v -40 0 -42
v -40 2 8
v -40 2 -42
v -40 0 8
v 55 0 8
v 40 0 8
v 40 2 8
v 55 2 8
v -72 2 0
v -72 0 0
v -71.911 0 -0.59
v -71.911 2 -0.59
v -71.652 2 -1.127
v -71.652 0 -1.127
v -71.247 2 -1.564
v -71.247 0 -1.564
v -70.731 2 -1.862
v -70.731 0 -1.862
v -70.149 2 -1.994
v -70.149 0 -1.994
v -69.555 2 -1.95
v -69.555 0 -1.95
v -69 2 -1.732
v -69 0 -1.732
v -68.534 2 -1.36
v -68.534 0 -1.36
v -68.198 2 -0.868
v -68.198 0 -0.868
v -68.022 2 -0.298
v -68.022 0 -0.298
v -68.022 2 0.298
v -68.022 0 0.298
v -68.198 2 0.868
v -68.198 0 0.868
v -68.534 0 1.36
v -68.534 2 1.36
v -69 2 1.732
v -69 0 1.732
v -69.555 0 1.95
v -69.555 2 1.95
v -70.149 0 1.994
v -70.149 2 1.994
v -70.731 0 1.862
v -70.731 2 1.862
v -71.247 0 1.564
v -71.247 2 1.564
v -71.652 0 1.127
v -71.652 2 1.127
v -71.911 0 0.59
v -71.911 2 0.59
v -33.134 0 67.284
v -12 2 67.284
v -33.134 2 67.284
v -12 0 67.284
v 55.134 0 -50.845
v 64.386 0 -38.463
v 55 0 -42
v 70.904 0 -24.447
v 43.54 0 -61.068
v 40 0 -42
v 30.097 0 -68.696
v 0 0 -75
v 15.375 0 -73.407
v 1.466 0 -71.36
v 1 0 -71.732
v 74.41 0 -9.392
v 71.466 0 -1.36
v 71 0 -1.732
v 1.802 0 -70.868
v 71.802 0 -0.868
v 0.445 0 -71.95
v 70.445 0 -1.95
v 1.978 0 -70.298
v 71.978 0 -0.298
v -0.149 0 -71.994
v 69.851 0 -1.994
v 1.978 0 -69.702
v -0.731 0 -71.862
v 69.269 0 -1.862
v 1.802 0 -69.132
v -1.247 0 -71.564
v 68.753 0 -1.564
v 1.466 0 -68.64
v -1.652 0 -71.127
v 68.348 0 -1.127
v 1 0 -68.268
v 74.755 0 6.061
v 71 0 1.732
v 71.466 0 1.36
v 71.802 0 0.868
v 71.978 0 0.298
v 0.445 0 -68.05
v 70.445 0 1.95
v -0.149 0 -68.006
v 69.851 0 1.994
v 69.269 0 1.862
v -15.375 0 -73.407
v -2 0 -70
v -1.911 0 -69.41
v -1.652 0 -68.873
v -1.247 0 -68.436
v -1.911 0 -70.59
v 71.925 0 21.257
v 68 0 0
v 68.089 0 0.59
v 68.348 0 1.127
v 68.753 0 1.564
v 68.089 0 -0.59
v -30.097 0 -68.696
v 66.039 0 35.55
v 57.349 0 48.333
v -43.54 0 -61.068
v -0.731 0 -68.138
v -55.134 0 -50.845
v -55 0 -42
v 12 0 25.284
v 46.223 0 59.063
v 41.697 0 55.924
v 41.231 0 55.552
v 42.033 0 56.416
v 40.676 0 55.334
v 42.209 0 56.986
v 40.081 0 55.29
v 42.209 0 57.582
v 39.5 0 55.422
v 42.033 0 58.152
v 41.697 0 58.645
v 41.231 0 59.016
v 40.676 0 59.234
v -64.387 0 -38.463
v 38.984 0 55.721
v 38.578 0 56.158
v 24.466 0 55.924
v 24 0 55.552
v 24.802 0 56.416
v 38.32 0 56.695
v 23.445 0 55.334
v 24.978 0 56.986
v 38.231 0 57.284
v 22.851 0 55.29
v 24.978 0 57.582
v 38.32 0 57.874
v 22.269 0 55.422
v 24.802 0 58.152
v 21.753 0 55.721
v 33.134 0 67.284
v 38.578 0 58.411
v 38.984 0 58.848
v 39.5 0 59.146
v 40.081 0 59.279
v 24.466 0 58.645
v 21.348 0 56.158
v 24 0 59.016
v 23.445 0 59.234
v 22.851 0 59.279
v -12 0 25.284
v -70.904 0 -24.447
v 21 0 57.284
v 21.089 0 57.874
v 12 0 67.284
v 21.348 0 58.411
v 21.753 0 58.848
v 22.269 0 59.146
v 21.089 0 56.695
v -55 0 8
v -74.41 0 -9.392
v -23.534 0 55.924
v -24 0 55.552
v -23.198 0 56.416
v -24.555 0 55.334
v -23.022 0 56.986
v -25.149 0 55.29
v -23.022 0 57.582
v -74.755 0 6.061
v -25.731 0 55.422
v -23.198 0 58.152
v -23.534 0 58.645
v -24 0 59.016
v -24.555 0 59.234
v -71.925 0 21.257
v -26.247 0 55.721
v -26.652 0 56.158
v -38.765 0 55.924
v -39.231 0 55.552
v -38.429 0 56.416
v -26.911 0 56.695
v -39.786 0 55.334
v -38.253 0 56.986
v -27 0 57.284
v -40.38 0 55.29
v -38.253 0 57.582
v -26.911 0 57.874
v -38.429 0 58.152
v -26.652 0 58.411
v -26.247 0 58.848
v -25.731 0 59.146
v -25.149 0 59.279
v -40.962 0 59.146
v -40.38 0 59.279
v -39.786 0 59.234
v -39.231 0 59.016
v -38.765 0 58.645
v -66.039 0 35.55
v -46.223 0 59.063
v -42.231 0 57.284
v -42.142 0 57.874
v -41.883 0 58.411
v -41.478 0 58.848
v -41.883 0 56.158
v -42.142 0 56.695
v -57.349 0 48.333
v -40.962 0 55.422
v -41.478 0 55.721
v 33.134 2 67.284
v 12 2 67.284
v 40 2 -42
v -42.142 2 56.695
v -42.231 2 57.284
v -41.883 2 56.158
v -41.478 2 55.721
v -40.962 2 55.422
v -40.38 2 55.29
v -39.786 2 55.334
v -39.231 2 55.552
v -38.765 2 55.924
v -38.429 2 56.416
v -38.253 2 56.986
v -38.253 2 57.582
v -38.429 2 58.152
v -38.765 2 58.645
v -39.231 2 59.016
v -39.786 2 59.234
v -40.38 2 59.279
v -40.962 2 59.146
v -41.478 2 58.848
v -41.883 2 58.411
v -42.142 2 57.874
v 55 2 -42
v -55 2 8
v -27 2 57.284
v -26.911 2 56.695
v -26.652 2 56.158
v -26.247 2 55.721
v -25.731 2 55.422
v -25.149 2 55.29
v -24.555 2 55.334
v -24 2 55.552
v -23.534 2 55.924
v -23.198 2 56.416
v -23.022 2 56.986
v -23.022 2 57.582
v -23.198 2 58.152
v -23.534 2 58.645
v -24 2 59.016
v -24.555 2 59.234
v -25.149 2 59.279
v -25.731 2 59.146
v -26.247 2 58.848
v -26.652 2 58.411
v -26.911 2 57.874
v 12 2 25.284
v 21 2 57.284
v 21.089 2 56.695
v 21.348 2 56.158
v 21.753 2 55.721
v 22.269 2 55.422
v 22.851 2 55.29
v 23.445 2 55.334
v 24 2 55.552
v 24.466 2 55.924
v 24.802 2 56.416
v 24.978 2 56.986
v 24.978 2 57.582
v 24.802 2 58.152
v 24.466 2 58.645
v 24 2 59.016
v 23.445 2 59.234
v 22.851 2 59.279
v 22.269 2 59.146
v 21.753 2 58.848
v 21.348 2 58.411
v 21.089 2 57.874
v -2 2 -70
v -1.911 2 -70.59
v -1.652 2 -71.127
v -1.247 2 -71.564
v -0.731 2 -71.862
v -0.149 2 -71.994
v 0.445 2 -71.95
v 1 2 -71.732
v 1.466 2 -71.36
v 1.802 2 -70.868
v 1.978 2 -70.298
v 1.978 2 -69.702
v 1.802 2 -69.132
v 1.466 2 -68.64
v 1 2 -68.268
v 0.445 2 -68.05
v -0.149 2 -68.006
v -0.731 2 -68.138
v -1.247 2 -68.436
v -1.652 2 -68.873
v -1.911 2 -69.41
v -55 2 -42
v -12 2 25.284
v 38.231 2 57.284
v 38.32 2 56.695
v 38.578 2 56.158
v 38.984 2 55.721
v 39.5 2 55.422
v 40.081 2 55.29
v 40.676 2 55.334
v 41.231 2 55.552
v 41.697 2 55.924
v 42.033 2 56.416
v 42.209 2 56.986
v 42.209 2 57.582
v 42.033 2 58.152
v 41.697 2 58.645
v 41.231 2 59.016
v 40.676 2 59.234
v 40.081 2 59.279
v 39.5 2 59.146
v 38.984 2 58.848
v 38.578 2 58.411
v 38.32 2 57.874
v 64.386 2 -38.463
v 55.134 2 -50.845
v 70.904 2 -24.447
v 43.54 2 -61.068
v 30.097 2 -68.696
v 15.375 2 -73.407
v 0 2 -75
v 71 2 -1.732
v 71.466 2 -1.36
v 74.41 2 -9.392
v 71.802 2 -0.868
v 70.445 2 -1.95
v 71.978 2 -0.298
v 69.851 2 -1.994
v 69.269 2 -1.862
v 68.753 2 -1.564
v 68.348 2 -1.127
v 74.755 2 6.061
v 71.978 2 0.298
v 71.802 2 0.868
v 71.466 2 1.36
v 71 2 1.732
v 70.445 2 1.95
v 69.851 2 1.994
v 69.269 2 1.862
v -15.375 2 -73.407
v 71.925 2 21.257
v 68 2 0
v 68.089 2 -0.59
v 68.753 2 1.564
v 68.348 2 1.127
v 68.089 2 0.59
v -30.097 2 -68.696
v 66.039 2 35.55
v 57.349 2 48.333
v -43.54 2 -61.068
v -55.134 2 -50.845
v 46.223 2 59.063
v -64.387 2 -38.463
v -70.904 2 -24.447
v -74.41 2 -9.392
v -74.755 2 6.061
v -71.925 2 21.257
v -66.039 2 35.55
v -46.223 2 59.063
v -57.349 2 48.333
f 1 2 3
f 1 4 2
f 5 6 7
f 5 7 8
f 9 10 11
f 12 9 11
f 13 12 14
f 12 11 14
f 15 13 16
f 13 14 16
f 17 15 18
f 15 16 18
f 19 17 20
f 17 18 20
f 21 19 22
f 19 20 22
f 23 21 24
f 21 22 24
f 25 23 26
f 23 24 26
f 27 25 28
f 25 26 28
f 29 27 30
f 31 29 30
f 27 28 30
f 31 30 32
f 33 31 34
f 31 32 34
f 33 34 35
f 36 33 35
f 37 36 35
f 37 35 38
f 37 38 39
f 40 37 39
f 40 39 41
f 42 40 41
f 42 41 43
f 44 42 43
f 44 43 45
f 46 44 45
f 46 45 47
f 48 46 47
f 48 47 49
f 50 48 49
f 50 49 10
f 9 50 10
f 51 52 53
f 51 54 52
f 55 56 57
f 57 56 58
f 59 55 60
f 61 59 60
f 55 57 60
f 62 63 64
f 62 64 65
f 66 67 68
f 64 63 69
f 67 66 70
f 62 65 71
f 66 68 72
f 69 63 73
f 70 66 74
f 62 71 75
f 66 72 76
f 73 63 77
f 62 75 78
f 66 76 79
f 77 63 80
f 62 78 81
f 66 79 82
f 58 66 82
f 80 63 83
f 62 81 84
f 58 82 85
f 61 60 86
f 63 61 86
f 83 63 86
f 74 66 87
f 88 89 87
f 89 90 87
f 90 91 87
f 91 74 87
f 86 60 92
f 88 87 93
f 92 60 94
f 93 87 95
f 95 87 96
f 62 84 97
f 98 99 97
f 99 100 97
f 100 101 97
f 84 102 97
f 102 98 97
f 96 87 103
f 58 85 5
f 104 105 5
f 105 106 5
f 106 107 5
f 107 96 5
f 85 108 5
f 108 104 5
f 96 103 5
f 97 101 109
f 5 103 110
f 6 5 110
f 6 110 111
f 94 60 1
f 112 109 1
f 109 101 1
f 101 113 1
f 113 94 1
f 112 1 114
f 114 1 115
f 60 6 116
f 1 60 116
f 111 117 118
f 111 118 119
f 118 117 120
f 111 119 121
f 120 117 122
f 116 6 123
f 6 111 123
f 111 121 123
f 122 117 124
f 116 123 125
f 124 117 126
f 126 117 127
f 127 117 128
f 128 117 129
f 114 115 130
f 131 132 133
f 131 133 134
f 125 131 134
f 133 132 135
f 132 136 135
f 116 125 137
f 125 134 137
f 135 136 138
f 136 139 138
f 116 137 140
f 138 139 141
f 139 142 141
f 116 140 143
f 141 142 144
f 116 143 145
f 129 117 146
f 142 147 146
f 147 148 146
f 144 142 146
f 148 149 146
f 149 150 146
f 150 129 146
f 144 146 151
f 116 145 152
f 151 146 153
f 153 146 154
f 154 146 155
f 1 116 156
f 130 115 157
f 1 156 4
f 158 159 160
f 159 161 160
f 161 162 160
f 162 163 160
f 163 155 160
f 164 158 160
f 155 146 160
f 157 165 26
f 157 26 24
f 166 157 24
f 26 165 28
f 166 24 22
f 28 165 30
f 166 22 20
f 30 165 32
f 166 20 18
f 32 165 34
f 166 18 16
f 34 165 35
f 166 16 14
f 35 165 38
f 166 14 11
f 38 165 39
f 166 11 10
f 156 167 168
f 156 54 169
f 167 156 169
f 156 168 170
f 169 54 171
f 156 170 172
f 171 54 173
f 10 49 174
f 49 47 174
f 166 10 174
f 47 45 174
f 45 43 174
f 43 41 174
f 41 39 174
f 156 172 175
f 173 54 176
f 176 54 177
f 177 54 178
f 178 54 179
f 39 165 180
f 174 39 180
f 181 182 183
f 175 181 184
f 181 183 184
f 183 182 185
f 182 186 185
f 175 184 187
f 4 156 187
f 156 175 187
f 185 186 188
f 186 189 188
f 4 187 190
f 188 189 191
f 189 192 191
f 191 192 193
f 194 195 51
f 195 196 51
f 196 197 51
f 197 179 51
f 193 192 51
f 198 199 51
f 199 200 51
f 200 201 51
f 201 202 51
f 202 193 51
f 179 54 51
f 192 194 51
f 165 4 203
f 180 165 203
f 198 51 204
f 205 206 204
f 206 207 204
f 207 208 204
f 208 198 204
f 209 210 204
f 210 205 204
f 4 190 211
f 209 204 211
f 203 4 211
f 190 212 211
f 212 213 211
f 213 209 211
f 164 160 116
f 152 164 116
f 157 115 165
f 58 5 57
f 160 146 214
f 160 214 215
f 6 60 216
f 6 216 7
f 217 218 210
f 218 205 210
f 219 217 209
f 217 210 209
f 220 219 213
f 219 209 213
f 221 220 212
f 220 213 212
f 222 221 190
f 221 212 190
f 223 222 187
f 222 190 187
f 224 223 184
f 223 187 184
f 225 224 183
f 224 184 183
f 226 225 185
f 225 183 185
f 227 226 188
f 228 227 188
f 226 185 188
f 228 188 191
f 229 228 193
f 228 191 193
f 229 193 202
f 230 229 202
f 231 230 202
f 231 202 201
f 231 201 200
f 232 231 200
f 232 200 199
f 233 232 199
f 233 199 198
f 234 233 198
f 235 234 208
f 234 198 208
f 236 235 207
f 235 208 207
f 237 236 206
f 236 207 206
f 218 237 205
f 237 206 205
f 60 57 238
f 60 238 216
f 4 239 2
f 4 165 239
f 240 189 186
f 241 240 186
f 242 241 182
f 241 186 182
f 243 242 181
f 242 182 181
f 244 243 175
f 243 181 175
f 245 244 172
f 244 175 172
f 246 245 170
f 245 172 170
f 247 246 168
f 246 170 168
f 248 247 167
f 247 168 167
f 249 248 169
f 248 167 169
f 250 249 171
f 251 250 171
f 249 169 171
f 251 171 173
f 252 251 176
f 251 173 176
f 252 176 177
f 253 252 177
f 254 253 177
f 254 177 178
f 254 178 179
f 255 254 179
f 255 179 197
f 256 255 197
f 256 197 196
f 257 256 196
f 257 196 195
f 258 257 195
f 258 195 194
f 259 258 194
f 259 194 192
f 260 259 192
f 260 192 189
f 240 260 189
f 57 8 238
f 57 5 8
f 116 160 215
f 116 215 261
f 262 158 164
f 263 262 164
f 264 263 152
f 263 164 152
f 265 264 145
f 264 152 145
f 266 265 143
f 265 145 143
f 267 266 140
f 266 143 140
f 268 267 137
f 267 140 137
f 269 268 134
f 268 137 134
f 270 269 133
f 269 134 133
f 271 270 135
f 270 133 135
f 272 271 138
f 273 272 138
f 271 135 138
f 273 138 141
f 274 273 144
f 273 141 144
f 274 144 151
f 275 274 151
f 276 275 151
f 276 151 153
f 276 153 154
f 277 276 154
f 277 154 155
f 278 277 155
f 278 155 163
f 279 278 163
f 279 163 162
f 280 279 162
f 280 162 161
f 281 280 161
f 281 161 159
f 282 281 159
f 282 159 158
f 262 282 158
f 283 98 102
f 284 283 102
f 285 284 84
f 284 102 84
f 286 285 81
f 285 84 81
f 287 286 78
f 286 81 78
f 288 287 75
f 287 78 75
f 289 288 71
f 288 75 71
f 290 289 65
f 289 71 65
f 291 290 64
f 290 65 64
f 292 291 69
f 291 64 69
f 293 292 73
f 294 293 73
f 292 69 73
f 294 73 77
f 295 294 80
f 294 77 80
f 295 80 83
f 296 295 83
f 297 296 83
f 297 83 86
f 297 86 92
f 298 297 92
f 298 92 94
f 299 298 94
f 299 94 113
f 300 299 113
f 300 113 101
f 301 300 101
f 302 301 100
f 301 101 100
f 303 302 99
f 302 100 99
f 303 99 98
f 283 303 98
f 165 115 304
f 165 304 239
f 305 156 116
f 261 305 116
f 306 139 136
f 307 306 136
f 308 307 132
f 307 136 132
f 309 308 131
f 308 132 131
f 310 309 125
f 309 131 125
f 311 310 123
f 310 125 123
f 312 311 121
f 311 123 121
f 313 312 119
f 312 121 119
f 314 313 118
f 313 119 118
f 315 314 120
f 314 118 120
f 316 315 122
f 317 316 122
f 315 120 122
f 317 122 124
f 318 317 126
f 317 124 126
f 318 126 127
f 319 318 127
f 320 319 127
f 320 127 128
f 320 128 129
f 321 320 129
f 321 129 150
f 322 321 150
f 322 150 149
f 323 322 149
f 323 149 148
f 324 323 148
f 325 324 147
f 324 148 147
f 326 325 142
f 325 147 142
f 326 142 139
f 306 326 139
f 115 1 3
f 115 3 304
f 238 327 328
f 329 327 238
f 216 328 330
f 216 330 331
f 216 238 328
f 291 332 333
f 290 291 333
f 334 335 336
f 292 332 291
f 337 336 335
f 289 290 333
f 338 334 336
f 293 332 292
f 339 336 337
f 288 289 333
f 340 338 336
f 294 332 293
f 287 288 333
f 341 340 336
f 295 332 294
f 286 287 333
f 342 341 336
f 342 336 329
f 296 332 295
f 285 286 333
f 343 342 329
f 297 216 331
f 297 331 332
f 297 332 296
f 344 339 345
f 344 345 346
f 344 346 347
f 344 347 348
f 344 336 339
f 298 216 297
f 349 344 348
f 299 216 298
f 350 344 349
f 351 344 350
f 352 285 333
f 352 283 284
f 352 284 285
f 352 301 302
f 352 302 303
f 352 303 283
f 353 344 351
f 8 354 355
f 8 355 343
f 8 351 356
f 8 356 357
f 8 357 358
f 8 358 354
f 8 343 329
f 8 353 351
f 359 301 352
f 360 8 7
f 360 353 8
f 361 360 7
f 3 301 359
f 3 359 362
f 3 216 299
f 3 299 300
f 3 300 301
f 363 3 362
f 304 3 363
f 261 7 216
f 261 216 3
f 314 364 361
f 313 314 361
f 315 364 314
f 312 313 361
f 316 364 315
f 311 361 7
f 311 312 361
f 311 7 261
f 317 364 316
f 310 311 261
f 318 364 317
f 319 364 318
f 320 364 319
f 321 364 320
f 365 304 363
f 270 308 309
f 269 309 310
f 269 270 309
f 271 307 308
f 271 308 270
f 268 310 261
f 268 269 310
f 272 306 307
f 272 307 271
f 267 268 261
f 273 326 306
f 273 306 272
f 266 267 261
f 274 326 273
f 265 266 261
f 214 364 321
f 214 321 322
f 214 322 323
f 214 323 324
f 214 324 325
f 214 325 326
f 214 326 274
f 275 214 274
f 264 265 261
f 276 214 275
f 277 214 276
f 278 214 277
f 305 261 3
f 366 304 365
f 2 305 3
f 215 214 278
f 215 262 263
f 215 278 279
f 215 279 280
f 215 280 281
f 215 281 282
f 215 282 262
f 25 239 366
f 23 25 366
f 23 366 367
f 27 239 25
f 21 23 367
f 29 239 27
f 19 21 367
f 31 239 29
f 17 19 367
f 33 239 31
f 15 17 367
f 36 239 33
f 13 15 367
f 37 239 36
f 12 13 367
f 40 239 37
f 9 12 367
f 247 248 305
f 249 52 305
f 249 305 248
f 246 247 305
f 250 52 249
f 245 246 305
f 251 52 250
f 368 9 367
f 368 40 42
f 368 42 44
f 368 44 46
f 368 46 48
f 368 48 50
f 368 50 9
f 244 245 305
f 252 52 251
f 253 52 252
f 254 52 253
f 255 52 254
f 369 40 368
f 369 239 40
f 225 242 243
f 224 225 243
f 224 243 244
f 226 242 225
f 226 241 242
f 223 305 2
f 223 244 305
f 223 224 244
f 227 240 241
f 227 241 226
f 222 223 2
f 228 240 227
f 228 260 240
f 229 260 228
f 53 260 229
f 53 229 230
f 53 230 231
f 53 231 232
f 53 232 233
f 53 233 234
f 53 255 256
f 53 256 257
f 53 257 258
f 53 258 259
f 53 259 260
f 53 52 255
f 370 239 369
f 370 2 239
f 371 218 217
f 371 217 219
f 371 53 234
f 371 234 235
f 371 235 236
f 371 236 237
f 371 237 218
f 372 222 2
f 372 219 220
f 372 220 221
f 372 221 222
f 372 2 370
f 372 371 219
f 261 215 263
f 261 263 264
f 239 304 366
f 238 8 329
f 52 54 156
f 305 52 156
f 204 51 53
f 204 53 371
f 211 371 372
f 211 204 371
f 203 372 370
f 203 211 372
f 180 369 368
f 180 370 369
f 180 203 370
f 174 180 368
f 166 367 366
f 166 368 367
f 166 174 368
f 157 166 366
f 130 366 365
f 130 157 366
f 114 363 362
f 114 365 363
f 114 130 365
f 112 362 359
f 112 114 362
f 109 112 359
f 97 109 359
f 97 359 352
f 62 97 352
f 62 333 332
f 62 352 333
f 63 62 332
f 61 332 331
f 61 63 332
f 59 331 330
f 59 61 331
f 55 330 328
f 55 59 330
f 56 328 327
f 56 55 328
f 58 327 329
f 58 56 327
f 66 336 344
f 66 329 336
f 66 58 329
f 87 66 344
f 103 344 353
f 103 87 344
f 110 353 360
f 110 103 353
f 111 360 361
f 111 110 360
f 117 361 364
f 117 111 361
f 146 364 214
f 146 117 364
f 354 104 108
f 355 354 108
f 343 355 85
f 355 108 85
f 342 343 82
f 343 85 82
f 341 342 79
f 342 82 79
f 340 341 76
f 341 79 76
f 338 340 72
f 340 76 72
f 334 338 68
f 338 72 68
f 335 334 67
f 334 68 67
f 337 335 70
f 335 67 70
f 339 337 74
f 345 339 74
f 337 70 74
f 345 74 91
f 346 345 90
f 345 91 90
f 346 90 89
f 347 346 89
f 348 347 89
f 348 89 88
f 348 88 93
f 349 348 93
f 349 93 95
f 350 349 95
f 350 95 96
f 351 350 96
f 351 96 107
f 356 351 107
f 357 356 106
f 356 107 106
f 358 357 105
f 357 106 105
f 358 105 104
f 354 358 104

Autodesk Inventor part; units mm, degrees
ref_plane "YZ Plane" through (0, 0, 0) normal (1, 0, 0) x (0, 1, 0)
ref_plane "XZ Plane" through (0, 0, 0) normal (0, 1, 0) x (-1, 0, 0)
ref_plane "XY Plane" through (0, 0, 0) normal (0, 0, 1) x (1, 0, 0)
sketch "Boceto1" plane through (0, 0, 0) normal (0, 1, 0) x (-1, 0, 0)
  arc A0 (-18, 72.808) -> (20, 72.2842) centre (0, 0) ccw
  line L0 (-18, 72.808) -> (-18, 72.2842)
  line L1 (55, 8) -> (40, 8)
  line L2 (40, 8) -> (40, -42)
  line L3 (40, -42) -> (55, -42)
  line L4 (55, -42) -> (55, 8)
  line L5 (-40, 8) -> (-55, 8)
  line L6 (-55, 8) -> (-55, -42)
  line L7 (-55, -42) -> (-40, -42)
  line L8 (-40, -42) -> (-40, 8)
  line L9 (20, 72.2842) -> (12, 72.2842)
  line L10 (12, 72.2842) -> (12, 25.2842)
  line L11 (-18, 72.808) -> (-12, 72.808)
  line L12 (-12, 72.808) -> (-12, 25.2842)
  line L13 (-18, 72.2842) -> (-18, 72.808)
  line L14 (12, 25.2842) -> (-12, 25.2842)
  line L15 (-30.8486, 25.2842) -> (-30.8486, 25)
  dimension "d0" = 150
  dimension "d1" = 18
  dimension "d3" = 15
  dimension "d4" = 50
  dimension "d5" = 15
  dimension "d6" = 50
  dimension "d7" = 40
  dimension "d8" = 40
  dimension "d28" = 24
  dimension "d29" = 12
  dimension "d33" = 8
  dimension "d34" = 8
  dimension "d36" = 47
extrude "Extrusión1" add sketch "Boceto1" along normal blind 2
sketch "Boceto2" plane through (0, 0, 0) normal (0, 1, 0) x (-1, 0, 0)
  line L0 (-74.7999, 67.2842) -> (80.1068, 67.2842)
  line L1 (80.1068, 67.2842) -> (80.1068, 81.1614)
  line L2 (80.1068, 81.1614) -> (-74.7999, 81.1614)
  line L3 (-74.7999, 81.1614) -> (-74.7999, 67.2842)
  line L4 (20, 72.2842) -> (12, 72.2842) projected
  point P0 (0, 0)
  dimension "d13" = 5
extrude "Extrusión2" cut sketch "Boceto2" along normal blind 2
sketch "Boceto3" plane through (0, 0, 0) normal (0, 1, 0) x (-1, 0, 0)
  circle A0 centre (-70, 0) radius 2
  circle A1 centre (0, -70) radius 2
  circle A2 centre (70, 0) radius 2
  point P0 (0, 0)
  dimension "d14" = 4
  dimension "d15" = 4
  dimension "d16" = 4
  dimension "d17" = 70
  dimension "d18" = 70
  dimension "d19" = 70
extrude "Extrusión3" cut sketch "Boceto3" along normal mid plane 6
sketch "Boceto6" plane through (0, 0, 0) normal (0, 1, 0) x (-1, 0, 0)
  line L0 (-27, 57.2842) -> (-36.2309, 57.2842)
  arc A0 (-43.4373, 54.8927) -> (-36.2309, 57.2842) centre (-40.2309, 57.2842) ccw
  arc A1 (-27, 57.2842) -> (-23, 53.2842) centre (-23, 57.2842) ccw
  circle A2 centre (-23, 57.2842) radius 2
  arc A3 (25, 53.2842) -> (29, 57.2842) centre (25, 57.2842) ccw
  circle A4 centre (25, 57.2842) radius 2
  arc A5 (36.2309, 57.2842) -> (43.4373, 54.8927) centre (40.2309, 57.2842) ccw
  circle A6 centre (40.2309, 57.2842) radius 2
  circle A7 centre (-40.2309, 57.2842) radius 2
  point P0 (0, 0)
  dimension "d22" = 4
  dimension "d23" = 4
  dimension "d24" = 4
  dimension "d25" = 4
extrude "Extrusión4" cut sketch "Boceto6" along normal mid plane 6
properties part number "Tapa" material "Nilón 6/6"
